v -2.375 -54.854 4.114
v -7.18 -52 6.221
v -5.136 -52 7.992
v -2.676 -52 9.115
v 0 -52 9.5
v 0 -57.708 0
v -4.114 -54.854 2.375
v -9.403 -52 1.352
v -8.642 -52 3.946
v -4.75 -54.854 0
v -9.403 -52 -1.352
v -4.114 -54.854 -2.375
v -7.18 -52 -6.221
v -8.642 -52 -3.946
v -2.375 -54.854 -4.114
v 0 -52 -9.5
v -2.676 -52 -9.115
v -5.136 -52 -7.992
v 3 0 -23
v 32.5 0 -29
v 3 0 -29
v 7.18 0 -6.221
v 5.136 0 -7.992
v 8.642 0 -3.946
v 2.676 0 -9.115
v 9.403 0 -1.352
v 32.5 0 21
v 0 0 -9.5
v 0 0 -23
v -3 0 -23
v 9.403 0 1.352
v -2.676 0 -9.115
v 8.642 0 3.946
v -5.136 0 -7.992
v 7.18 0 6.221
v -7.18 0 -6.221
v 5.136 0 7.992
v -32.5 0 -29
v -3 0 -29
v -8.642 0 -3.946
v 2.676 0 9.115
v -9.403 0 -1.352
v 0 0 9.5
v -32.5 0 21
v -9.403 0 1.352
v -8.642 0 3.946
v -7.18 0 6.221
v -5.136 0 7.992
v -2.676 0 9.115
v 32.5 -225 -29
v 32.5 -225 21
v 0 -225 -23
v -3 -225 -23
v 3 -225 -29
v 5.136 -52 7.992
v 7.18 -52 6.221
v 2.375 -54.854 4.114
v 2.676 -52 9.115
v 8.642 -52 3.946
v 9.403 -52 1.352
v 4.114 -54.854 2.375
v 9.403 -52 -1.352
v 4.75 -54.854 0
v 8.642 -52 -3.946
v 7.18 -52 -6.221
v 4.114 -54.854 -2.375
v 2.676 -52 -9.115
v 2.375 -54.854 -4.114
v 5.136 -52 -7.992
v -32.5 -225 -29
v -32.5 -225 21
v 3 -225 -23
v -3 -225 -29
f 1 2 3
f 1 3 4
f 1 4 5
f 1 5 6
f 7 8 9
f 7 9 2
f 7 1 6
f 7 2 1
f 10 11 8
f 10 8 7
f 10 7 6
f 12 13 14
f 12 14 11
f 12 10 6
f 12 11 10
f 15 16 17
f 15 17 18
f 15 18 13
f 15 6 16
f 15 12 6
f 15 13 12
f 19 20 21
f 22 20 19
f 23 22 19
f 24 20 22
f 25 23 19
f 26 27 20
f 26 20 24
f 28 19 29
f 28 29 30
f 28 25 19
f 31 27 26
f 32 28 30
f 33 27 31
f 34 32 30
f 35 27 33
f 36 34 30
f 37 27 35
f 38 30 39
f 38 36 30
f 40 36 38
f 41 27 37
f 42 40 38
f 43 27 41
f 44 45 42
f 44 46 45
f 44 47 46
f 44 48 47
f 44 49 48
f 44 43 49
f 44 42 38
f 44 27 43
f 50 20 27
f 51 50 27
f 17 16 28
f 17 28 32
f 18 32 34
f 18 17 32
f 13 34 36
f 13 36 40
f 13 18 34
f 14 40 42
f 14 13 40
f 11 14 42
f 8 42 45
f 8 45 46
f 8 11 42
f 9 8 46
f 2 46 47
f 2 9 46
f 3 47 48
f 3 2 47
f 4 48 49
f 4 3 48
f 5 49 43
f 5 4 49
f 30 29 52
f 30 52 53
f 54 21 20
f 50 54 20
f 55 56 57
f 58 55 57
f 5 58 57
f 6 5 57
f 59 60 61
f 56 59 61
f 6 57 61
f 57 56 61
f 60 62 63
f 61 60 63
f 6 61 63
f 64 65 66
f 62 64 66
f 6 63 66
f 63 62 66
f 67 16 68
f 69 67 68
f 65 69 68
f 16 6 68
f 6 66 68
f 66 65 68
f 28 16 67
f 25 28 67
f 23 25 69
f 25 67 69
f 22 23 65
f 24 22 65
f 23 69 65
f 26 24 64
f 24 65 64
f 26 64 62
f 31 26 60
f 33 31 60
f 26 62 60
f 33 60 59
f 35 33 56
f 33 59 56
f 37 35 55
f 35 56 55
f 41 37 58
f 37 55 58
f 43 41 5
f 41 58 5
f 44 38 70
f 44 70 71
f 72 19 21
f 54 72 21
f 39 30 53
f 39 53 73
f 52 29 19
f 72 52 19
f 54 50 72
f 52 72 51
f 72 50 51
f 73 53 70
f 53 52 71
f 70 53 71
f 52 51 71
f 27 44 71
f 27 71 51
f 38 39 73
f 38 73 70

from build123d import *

# Parameters (mm, degrees)
F1_DEPTH = 225
F3_D     = 19
F3_DEPTH = 52
F3_TIP   = 5.7081758808


with BuildPart() as f1:
    # F0 (on Front) → F1 (new body)
    with BuildSketch(Plane.XZ):
        Polygon((32.5, 21), (0, 21), (0, -23), (3, -23), (3, -29), (32.5, -29), align=None)
    extrude(amount=F1_DEPTH)

    # F3
    with Locations(Plane(origin=(0, 0, 0), x_dir=(-1, 0, 0), z_dir=(0, 1, 0))):
        with Locations((0, 0)):
            Hole(F3_D / 2, depth=F3_DEPTH)
            with Locations((0, 0, -(F3_DEPTH + F3_TIP / 2))):  # 118° drill point
                Cone(0, F3_D / 2, F3_TIP, mode=Mode.SUBTRACT)

    # F4: F1 across face


with BuildPart() as f1_1:
    add(f1.part)
    add(f1.part.mirror(Plane(origin=(0, -122.5069848753, -1.1176625039), x_dir=(0, -1, 0), z_dir=(-1, 0, 0))))


solid = f1_1.part
